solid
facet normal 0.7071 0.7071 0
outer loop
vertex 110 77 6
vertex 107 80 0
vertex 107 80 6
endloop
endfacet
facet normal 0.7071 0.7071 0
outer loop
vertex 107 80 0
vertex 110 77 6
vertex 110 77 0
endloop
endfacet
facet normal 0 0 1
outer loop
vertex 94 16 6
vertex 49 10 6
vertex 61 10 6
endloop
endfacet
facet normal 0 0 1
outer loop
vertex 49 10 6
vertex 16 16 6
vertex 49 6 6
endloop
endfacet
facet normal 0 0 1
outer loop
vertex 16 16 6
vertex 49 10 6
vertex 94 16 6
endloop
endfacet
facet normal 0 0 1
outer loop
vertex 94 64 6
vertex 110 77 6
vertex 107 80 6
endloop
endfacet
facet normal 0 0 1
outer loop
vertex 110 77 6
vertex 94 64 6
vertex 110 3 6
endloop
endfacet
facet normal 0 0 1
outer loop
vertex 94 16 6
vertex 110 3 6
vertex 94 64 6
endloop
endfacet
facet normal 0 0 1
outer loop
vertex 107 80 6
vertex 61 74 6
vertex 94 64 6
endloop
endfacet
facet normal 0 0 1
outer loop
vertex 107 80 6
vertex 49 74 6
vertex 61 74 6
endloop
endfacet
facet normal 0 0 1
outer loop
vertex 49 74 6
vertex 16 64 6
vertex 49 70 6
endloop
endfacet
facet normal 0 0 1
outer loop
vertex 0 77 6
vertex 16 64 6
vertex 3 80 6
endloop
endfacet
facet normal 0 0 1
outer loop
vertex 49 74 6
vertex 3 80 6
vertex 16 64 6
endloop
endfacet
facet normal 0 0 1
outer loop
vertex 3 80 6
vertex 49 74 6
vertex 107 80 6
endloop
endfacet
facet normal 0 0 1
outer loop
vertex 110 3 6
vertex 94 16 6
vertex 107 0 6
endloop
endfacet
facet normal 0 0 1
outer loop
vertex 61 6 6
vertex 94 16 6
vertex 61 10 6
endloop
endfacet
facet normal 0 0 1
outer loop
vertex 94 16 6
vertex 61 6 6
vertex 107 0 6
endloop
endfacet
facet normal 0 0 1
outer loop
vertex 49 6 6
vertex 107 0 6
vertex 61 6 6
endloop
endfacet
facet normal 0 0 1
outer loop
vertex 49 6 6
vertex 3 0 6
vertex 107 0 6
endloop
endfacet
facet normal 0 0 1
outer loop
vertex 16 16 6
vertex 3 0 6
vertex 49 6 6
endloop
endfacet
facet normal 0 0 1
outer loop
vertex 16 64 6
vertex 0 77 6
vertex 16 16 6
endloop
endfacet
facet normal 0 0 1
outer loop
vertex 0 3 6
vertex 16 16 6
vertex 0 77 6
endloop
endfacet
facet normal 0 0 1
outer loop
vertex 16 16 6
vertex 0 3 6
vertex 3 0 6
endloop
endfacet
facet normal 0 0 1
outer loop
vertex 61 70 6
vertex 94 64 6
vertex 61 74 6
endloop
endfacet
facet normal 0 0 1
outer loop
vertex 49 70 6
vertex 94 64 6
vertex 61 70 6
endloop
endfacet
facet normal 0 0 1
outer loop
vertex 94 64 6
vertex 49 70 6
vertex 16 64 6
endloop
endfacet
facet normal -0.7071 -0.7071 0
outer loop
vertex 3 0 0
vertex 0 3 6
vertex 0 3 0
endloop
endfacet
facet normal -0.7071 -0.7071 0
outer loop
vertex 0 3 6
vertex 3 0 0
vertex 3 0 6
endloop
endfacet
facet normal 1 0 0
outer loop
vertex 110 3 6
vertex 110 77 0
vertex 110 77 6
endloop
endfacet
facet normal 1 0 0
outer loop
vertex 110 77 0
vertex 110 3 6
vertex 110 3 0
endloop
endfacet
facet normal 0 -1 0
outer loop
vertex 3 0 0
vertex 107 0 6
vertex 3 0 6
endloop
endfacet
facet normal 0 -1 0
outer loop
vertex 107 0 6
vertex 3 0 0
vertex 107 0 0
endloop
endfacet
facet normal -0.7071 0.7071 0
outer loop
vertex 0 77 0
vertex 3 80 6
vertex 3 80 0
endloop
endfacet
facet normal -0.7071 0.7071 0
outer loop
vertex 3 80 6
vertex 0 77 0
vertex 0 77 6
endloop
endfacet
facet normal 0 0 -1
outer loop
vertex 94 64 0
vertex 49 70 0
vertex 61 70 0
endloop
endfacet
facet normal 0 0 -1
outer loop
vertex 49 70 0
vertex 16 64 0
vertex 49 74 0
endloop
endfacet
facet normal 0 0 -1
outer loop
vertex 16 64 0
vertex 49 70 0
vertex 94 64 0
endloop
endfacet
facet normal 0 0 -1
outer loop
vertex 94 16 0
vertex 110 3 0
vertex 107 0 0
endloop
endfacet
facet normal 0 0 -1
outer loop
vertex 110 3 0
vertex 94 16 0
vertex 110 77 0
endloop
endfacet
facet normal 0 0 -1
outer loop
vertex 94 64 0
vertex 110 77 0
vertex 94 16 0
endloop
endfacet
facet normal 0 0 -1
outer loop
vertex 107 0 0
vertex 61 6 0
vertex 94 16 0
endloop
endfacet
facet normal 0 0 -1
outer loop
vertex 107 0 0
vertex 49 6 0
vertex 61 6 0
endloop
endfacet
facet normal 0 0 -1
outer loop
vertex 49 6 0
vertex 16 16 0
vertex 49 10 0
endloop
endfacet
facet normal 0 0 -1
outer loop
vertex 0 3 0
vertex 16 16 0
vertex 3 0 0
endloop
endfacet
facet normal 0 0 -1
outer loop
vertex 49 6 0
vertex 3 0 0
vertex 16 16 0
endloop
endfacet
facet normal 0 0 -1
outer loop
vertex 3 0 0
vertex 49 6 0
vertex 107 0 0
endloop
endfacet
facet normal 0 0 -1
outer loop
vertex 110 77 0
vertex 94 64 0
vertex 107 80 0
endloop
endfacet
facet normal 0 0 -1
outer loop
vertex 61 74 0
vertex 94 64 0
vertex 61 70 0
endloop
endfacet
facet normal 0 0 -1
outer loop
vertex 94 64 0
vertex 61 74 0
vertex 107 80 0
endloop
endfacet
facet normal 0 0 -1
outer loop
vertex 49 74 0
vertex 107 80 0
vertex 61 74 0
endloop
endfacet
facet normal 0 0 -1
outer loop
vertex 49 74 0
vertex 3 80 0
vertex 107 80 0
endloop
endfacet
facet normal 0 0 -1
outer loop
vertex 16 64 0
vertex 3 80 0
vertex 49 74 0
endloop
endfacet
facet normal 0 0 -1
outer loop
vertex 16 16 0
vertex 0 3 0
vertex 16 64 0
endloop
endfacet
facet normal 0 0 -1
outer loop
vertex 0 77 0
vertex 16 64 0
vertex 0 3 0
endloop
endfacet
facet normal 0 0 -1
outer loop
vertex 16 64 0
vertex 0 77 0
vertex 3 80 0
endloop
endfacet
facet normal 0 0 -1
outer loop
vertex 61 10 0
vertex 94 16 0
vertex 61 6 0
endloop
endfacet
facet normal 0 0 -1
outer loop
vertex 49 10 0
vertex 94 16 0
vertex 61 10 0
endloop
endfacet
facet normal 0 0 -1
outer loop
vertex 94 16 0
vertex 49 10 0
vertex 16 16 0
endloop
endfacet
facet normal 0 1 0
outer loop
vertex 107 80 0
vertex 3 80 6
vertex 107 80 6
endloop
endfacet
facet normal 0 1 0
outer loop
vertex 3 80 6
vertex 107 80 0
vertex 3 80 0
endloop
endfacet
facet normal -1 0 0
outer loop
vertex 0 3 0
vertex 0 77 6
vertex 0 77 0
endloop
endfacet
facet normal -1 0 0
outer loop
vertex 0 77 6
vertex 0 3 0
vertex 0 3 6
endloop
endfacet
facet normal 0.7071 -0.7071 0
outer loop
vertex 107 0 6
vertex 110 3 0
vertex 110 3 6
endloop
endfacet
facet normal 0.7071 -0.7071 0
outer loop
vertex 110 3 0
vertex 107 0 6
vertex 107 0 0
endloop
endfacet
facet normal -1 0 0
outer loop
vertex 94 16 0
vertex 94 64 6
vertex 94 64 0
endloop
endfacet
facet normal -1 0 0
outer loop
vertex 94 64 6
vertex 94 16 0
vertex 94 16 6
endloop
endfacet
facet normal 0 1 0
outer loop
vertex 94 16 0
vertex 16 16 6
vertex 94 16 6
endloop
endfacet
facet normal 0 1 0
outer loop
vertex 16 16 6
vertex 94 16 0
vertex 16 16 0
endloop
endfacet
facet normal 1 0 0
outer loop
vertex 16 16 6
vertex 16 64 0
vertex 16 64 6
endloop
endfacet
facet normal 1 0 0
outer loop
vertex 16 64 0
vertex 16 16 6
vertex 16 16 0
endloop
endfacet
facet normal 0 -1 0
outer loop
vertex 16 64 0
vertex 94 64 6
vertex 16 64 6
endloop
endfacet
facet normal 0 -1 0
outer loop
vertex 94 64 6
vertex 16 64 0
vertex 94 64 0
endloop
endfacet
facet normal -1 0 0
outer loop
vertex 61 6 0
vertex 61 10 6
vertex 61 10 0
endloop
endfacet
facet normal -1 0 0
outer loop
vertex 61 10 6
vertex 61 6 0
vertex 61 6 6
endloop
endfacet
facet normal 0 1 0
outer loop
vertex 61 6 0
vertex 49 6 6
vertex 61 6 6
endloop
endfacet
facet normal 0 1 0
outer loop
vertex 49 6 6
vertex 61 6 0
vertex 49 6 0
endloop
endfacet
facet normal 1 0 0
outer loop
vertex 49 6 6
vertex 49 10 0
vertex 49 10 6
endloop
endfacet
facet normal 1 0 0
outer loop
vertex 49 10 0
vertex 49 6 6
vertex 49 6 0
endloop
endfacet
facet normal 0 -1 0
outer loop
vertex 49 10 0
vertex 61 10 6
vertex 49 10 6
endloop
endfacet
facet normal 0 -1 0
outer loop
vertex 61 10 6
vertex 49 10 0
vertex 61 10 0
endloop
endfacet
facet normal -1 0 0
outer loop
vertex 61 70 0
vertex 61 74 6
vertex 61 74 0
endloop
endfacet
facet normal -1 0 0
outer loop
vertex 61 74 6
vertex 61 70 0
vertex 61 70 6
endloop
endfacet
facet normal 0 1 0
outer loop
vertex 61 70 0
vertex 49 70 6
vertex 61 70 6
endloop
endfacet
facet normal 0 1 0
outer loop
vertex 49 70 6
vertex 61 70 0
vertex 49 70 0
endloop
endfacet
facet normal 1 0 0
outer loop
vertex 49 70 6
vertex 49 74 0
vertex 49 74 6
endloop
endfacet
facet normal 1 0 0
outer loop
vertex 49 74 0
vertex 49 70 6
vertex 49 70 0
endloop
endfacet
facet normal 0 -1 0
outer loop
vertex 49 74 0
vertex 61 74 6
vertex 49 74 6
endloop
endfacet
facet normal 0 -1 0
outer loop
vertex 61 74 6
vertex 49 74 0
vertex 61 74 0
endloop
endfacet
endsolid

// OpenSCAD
$fn = 32;

// ----------------------------------------------------------------------
// Frame plate: 110 x 80 frame, 16 mm rails
// ----------------------------------------------------------------------

// --- parameters (mm) ---
plate_l = 110;            // plate length, X
plate_w = 80;             // plate width, Y
plate_t = 6;              // plate thickness, Z (extrusion height)
corner_c = 3;             // corner chamfer
frame_bar = 16;           // frame rail width
slot_l = 12;              // adjustment slot length
slot_w = 4;               // adjustment slot width
fit_tol = 0.02;           // declared fit tolerance (prompt contract)
free_tol = 0.2;           // declared free tolerance (prompt contract)

win_l = plate_l - 2 * frame_bar;  // window length
win_w = plate_w - 2 * frame_bar;  // window width

profile = [[3, 0], [107, 0], [110, 3], [110, 77], [107, 80], [3, 80], [0, 77], [0, 3]];  // primary outline, 8 points, counter clockwise
void_1 = [[16, 16], [94, 16], [94, 64], [16, 64]];  // the window, 4 points
void_2 = [[49, 6], [61, 6], [61, 10], [49, 10]];  // adjustment slot, 4 points
void_3 = [[49, 70], [61, 70], [61, 74], [49, 74]];  // adjustment slot, 4 points

// --- the one profile operation ---
difference() {
  linear_extrude(height = plate_t) polygon(points = profile);
  translate([0, 0, -1])
    linear_extrude(height = plate_t + 2) polygon(points = void_1);
  translate([0, 0, -1])
    linear_extrude(height = plate_t + 2) polygon(points = void_2);
  translate([0, 0, -1])
    linear_extrude(height = plate_t + 2) polygon(points = void_3);
}
